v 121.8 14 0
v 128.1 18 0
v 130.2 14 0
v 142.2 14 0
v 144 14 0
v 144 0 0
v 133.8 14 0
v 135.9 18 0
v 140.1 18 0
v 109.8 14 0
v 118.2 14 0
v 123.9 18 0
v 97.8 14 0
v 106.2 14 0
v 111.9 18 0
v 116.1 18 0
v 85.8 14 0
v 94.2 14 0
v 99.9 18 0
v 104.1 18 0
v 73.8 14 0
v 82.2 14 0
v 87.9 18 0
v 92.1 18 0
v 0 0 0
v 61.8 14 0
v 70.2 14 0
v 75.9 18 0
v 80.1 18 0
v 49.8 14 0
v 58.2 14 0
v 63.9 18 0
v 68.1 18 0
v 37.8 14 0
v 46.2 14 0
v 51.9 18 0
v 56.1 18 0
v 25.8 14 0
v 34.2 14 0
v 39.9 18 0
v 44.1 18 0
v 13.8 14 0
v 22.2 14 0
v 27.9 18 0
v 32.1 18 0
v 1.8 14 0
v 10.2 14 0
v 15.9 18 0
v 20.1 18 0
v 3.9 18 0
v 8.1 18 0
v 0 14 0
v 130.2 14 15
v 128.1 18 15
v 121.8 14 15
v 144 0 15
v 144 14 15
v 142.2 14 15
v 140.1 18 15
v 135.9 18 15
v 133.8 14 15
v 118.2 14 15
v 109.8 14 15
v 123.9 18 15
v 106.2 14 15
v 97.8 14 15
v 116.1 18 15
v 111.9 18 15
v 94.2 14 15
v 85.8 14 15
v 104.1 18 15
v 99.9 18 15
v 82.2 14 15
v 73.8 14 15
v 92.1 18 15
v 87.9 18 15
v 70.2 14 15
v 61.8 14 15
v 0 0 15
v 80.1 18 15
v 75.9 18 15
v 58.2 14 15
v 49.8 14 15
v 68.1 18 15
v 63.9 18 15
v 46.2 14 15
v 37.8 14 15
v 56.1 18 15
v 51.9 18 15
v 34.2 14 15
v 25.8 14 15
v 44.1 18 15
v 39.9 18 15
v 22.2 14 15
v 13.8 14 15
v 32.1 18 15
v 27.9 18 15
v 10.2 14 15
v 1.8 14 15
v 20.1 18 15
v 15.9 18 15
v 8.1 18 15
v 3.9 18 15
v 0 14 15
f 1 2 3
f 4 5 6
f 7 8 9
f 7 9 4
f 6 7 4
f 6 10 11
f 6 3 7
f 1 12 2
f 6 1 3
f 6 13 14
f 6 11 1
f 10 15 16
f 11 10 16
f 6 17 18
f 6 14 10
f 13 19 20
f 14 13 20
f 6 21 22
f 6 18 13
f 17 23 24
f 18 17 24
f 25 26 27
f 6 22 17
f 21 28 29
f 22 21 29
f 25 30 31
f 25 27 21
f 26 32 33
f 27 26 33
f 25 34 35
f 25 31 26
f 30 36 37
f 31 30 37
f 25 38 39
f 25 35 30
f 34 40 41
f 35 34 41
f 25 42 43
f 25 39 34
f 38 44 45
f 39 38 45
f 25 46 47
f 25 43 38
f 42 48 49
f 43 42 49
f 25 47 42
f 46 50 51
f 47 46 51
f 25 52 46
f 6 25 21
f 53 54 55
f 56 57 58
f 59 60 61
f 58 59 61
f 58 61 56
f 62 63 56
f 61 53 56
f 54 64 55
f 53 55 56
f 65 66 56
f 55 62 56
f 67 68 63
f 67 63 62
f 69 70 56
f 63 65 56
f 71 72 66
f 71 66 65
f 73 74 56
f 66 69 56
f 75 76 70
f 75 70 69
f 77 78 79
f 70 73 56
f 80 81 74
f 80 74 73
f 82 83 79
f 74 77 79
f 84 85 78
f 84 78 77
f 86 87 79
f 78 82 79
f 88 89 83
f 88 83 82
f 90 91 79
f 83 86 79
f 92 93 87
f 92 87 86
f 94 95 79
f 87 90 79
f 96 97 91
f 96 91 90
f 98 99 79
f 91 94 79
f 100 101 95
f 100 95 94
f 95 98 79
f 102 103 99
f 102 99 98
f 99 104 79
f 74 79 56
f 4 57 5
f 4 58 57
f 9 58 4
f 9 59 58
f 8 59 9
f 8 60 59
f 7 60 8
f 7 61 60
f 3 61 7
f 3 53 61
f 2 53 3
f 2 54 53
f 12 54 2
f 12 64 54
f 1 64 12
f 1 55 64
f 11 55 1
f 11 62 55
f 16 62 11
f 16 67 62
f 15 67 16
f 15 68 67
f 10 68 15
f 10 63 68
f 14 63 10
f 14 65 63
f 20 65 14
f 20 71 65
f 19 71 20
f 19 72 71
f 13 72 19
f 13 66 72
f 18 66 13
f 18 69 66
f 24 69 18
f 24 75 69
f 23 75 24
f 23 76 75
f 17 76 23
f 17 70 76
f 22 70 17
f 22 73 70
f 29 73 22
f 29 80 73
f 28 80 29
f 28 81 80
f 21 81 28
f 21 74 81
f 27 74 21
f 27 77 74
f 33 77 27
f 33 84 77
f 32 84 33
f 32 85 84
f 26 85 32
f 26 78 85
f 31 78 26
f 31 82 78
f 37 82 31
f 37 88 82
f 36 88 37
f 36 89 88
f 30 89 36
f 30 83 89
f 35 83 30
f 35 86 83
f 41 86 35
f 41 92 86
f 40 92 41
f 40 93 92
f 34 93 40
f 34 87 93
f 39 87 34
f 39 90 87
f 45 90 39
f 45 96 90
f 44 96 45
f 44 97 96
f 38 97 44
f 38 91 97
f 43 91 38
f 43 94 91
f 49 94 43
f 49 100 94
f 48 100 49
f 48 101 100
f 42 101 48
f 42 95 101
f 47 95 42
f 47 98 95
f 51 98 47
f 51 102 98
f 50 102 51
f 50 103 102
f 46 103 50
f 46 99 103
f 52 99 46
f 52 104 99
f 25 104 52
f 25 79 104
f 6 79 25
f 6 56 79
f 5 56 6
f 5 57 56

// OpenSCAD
$fn = 32;

// ----------------------------------------------------------------------
// Gear rack: 12 teeth, pitch 12 mm
// ----------------------------------------------------------------------

// --- parameters (mm) ---
teeth = 12;               // number of teeth
pitch = 12;               // tooth pitch, X
root_w = 8.4;             // tooth width at the root
tip_w = 4.2;              // tooth width at the tip
base_h = 14;              // rack body height, Y
tooth_h = 4;              // tooth height above the body
plate_t = 15;             // rack width, Z (extrusion height)

rack_l = teeth * pitch;  // overall length
total_h = base_h + tooth_h;  // overall height

profile = [[0, 0], [144, 0], [144, 14], [142.2, 14], [140.1, 18], [135.9, 18], [133.8, 14], [130.2, 14], [128.1, 18], [123.9, 18], [121.8, 14], [118.2, 14], [116.1, 18], [111.9, 18], [109.8, 14], [106.2, 14], [104.1, 18], [99.9, 18], [97.8, 14], [94.2, 14], [92.1, 18], [87.9, 18], [85.8, 14], [82.2, 14], [80.1, 18], [75.9, 18], [73.8, 14], [70.2, 14], [68.1, 18], [63.9, 18], [61.8, 14], [58.2, 14], [56.1, 18], [51.9, 18], [49.8, 14], [46.2, 14], [44.1, 18], [39.9, 18], [37.8, 14], [34.2, 14], [32.1, 18], [27.9, 18], [25.8, 14], [22.2, 14], [20.1, 18], [15.9, 18], [13.8, 14], [10.2, 14], [8.1, 18], [3.9, 18], [1.8, 14], [0, 14]];  // primary outline, 52 points, counter clockwise

// --- the one profile operation ---
linear_extrude(height = plate_t) polygon(points = profile);
